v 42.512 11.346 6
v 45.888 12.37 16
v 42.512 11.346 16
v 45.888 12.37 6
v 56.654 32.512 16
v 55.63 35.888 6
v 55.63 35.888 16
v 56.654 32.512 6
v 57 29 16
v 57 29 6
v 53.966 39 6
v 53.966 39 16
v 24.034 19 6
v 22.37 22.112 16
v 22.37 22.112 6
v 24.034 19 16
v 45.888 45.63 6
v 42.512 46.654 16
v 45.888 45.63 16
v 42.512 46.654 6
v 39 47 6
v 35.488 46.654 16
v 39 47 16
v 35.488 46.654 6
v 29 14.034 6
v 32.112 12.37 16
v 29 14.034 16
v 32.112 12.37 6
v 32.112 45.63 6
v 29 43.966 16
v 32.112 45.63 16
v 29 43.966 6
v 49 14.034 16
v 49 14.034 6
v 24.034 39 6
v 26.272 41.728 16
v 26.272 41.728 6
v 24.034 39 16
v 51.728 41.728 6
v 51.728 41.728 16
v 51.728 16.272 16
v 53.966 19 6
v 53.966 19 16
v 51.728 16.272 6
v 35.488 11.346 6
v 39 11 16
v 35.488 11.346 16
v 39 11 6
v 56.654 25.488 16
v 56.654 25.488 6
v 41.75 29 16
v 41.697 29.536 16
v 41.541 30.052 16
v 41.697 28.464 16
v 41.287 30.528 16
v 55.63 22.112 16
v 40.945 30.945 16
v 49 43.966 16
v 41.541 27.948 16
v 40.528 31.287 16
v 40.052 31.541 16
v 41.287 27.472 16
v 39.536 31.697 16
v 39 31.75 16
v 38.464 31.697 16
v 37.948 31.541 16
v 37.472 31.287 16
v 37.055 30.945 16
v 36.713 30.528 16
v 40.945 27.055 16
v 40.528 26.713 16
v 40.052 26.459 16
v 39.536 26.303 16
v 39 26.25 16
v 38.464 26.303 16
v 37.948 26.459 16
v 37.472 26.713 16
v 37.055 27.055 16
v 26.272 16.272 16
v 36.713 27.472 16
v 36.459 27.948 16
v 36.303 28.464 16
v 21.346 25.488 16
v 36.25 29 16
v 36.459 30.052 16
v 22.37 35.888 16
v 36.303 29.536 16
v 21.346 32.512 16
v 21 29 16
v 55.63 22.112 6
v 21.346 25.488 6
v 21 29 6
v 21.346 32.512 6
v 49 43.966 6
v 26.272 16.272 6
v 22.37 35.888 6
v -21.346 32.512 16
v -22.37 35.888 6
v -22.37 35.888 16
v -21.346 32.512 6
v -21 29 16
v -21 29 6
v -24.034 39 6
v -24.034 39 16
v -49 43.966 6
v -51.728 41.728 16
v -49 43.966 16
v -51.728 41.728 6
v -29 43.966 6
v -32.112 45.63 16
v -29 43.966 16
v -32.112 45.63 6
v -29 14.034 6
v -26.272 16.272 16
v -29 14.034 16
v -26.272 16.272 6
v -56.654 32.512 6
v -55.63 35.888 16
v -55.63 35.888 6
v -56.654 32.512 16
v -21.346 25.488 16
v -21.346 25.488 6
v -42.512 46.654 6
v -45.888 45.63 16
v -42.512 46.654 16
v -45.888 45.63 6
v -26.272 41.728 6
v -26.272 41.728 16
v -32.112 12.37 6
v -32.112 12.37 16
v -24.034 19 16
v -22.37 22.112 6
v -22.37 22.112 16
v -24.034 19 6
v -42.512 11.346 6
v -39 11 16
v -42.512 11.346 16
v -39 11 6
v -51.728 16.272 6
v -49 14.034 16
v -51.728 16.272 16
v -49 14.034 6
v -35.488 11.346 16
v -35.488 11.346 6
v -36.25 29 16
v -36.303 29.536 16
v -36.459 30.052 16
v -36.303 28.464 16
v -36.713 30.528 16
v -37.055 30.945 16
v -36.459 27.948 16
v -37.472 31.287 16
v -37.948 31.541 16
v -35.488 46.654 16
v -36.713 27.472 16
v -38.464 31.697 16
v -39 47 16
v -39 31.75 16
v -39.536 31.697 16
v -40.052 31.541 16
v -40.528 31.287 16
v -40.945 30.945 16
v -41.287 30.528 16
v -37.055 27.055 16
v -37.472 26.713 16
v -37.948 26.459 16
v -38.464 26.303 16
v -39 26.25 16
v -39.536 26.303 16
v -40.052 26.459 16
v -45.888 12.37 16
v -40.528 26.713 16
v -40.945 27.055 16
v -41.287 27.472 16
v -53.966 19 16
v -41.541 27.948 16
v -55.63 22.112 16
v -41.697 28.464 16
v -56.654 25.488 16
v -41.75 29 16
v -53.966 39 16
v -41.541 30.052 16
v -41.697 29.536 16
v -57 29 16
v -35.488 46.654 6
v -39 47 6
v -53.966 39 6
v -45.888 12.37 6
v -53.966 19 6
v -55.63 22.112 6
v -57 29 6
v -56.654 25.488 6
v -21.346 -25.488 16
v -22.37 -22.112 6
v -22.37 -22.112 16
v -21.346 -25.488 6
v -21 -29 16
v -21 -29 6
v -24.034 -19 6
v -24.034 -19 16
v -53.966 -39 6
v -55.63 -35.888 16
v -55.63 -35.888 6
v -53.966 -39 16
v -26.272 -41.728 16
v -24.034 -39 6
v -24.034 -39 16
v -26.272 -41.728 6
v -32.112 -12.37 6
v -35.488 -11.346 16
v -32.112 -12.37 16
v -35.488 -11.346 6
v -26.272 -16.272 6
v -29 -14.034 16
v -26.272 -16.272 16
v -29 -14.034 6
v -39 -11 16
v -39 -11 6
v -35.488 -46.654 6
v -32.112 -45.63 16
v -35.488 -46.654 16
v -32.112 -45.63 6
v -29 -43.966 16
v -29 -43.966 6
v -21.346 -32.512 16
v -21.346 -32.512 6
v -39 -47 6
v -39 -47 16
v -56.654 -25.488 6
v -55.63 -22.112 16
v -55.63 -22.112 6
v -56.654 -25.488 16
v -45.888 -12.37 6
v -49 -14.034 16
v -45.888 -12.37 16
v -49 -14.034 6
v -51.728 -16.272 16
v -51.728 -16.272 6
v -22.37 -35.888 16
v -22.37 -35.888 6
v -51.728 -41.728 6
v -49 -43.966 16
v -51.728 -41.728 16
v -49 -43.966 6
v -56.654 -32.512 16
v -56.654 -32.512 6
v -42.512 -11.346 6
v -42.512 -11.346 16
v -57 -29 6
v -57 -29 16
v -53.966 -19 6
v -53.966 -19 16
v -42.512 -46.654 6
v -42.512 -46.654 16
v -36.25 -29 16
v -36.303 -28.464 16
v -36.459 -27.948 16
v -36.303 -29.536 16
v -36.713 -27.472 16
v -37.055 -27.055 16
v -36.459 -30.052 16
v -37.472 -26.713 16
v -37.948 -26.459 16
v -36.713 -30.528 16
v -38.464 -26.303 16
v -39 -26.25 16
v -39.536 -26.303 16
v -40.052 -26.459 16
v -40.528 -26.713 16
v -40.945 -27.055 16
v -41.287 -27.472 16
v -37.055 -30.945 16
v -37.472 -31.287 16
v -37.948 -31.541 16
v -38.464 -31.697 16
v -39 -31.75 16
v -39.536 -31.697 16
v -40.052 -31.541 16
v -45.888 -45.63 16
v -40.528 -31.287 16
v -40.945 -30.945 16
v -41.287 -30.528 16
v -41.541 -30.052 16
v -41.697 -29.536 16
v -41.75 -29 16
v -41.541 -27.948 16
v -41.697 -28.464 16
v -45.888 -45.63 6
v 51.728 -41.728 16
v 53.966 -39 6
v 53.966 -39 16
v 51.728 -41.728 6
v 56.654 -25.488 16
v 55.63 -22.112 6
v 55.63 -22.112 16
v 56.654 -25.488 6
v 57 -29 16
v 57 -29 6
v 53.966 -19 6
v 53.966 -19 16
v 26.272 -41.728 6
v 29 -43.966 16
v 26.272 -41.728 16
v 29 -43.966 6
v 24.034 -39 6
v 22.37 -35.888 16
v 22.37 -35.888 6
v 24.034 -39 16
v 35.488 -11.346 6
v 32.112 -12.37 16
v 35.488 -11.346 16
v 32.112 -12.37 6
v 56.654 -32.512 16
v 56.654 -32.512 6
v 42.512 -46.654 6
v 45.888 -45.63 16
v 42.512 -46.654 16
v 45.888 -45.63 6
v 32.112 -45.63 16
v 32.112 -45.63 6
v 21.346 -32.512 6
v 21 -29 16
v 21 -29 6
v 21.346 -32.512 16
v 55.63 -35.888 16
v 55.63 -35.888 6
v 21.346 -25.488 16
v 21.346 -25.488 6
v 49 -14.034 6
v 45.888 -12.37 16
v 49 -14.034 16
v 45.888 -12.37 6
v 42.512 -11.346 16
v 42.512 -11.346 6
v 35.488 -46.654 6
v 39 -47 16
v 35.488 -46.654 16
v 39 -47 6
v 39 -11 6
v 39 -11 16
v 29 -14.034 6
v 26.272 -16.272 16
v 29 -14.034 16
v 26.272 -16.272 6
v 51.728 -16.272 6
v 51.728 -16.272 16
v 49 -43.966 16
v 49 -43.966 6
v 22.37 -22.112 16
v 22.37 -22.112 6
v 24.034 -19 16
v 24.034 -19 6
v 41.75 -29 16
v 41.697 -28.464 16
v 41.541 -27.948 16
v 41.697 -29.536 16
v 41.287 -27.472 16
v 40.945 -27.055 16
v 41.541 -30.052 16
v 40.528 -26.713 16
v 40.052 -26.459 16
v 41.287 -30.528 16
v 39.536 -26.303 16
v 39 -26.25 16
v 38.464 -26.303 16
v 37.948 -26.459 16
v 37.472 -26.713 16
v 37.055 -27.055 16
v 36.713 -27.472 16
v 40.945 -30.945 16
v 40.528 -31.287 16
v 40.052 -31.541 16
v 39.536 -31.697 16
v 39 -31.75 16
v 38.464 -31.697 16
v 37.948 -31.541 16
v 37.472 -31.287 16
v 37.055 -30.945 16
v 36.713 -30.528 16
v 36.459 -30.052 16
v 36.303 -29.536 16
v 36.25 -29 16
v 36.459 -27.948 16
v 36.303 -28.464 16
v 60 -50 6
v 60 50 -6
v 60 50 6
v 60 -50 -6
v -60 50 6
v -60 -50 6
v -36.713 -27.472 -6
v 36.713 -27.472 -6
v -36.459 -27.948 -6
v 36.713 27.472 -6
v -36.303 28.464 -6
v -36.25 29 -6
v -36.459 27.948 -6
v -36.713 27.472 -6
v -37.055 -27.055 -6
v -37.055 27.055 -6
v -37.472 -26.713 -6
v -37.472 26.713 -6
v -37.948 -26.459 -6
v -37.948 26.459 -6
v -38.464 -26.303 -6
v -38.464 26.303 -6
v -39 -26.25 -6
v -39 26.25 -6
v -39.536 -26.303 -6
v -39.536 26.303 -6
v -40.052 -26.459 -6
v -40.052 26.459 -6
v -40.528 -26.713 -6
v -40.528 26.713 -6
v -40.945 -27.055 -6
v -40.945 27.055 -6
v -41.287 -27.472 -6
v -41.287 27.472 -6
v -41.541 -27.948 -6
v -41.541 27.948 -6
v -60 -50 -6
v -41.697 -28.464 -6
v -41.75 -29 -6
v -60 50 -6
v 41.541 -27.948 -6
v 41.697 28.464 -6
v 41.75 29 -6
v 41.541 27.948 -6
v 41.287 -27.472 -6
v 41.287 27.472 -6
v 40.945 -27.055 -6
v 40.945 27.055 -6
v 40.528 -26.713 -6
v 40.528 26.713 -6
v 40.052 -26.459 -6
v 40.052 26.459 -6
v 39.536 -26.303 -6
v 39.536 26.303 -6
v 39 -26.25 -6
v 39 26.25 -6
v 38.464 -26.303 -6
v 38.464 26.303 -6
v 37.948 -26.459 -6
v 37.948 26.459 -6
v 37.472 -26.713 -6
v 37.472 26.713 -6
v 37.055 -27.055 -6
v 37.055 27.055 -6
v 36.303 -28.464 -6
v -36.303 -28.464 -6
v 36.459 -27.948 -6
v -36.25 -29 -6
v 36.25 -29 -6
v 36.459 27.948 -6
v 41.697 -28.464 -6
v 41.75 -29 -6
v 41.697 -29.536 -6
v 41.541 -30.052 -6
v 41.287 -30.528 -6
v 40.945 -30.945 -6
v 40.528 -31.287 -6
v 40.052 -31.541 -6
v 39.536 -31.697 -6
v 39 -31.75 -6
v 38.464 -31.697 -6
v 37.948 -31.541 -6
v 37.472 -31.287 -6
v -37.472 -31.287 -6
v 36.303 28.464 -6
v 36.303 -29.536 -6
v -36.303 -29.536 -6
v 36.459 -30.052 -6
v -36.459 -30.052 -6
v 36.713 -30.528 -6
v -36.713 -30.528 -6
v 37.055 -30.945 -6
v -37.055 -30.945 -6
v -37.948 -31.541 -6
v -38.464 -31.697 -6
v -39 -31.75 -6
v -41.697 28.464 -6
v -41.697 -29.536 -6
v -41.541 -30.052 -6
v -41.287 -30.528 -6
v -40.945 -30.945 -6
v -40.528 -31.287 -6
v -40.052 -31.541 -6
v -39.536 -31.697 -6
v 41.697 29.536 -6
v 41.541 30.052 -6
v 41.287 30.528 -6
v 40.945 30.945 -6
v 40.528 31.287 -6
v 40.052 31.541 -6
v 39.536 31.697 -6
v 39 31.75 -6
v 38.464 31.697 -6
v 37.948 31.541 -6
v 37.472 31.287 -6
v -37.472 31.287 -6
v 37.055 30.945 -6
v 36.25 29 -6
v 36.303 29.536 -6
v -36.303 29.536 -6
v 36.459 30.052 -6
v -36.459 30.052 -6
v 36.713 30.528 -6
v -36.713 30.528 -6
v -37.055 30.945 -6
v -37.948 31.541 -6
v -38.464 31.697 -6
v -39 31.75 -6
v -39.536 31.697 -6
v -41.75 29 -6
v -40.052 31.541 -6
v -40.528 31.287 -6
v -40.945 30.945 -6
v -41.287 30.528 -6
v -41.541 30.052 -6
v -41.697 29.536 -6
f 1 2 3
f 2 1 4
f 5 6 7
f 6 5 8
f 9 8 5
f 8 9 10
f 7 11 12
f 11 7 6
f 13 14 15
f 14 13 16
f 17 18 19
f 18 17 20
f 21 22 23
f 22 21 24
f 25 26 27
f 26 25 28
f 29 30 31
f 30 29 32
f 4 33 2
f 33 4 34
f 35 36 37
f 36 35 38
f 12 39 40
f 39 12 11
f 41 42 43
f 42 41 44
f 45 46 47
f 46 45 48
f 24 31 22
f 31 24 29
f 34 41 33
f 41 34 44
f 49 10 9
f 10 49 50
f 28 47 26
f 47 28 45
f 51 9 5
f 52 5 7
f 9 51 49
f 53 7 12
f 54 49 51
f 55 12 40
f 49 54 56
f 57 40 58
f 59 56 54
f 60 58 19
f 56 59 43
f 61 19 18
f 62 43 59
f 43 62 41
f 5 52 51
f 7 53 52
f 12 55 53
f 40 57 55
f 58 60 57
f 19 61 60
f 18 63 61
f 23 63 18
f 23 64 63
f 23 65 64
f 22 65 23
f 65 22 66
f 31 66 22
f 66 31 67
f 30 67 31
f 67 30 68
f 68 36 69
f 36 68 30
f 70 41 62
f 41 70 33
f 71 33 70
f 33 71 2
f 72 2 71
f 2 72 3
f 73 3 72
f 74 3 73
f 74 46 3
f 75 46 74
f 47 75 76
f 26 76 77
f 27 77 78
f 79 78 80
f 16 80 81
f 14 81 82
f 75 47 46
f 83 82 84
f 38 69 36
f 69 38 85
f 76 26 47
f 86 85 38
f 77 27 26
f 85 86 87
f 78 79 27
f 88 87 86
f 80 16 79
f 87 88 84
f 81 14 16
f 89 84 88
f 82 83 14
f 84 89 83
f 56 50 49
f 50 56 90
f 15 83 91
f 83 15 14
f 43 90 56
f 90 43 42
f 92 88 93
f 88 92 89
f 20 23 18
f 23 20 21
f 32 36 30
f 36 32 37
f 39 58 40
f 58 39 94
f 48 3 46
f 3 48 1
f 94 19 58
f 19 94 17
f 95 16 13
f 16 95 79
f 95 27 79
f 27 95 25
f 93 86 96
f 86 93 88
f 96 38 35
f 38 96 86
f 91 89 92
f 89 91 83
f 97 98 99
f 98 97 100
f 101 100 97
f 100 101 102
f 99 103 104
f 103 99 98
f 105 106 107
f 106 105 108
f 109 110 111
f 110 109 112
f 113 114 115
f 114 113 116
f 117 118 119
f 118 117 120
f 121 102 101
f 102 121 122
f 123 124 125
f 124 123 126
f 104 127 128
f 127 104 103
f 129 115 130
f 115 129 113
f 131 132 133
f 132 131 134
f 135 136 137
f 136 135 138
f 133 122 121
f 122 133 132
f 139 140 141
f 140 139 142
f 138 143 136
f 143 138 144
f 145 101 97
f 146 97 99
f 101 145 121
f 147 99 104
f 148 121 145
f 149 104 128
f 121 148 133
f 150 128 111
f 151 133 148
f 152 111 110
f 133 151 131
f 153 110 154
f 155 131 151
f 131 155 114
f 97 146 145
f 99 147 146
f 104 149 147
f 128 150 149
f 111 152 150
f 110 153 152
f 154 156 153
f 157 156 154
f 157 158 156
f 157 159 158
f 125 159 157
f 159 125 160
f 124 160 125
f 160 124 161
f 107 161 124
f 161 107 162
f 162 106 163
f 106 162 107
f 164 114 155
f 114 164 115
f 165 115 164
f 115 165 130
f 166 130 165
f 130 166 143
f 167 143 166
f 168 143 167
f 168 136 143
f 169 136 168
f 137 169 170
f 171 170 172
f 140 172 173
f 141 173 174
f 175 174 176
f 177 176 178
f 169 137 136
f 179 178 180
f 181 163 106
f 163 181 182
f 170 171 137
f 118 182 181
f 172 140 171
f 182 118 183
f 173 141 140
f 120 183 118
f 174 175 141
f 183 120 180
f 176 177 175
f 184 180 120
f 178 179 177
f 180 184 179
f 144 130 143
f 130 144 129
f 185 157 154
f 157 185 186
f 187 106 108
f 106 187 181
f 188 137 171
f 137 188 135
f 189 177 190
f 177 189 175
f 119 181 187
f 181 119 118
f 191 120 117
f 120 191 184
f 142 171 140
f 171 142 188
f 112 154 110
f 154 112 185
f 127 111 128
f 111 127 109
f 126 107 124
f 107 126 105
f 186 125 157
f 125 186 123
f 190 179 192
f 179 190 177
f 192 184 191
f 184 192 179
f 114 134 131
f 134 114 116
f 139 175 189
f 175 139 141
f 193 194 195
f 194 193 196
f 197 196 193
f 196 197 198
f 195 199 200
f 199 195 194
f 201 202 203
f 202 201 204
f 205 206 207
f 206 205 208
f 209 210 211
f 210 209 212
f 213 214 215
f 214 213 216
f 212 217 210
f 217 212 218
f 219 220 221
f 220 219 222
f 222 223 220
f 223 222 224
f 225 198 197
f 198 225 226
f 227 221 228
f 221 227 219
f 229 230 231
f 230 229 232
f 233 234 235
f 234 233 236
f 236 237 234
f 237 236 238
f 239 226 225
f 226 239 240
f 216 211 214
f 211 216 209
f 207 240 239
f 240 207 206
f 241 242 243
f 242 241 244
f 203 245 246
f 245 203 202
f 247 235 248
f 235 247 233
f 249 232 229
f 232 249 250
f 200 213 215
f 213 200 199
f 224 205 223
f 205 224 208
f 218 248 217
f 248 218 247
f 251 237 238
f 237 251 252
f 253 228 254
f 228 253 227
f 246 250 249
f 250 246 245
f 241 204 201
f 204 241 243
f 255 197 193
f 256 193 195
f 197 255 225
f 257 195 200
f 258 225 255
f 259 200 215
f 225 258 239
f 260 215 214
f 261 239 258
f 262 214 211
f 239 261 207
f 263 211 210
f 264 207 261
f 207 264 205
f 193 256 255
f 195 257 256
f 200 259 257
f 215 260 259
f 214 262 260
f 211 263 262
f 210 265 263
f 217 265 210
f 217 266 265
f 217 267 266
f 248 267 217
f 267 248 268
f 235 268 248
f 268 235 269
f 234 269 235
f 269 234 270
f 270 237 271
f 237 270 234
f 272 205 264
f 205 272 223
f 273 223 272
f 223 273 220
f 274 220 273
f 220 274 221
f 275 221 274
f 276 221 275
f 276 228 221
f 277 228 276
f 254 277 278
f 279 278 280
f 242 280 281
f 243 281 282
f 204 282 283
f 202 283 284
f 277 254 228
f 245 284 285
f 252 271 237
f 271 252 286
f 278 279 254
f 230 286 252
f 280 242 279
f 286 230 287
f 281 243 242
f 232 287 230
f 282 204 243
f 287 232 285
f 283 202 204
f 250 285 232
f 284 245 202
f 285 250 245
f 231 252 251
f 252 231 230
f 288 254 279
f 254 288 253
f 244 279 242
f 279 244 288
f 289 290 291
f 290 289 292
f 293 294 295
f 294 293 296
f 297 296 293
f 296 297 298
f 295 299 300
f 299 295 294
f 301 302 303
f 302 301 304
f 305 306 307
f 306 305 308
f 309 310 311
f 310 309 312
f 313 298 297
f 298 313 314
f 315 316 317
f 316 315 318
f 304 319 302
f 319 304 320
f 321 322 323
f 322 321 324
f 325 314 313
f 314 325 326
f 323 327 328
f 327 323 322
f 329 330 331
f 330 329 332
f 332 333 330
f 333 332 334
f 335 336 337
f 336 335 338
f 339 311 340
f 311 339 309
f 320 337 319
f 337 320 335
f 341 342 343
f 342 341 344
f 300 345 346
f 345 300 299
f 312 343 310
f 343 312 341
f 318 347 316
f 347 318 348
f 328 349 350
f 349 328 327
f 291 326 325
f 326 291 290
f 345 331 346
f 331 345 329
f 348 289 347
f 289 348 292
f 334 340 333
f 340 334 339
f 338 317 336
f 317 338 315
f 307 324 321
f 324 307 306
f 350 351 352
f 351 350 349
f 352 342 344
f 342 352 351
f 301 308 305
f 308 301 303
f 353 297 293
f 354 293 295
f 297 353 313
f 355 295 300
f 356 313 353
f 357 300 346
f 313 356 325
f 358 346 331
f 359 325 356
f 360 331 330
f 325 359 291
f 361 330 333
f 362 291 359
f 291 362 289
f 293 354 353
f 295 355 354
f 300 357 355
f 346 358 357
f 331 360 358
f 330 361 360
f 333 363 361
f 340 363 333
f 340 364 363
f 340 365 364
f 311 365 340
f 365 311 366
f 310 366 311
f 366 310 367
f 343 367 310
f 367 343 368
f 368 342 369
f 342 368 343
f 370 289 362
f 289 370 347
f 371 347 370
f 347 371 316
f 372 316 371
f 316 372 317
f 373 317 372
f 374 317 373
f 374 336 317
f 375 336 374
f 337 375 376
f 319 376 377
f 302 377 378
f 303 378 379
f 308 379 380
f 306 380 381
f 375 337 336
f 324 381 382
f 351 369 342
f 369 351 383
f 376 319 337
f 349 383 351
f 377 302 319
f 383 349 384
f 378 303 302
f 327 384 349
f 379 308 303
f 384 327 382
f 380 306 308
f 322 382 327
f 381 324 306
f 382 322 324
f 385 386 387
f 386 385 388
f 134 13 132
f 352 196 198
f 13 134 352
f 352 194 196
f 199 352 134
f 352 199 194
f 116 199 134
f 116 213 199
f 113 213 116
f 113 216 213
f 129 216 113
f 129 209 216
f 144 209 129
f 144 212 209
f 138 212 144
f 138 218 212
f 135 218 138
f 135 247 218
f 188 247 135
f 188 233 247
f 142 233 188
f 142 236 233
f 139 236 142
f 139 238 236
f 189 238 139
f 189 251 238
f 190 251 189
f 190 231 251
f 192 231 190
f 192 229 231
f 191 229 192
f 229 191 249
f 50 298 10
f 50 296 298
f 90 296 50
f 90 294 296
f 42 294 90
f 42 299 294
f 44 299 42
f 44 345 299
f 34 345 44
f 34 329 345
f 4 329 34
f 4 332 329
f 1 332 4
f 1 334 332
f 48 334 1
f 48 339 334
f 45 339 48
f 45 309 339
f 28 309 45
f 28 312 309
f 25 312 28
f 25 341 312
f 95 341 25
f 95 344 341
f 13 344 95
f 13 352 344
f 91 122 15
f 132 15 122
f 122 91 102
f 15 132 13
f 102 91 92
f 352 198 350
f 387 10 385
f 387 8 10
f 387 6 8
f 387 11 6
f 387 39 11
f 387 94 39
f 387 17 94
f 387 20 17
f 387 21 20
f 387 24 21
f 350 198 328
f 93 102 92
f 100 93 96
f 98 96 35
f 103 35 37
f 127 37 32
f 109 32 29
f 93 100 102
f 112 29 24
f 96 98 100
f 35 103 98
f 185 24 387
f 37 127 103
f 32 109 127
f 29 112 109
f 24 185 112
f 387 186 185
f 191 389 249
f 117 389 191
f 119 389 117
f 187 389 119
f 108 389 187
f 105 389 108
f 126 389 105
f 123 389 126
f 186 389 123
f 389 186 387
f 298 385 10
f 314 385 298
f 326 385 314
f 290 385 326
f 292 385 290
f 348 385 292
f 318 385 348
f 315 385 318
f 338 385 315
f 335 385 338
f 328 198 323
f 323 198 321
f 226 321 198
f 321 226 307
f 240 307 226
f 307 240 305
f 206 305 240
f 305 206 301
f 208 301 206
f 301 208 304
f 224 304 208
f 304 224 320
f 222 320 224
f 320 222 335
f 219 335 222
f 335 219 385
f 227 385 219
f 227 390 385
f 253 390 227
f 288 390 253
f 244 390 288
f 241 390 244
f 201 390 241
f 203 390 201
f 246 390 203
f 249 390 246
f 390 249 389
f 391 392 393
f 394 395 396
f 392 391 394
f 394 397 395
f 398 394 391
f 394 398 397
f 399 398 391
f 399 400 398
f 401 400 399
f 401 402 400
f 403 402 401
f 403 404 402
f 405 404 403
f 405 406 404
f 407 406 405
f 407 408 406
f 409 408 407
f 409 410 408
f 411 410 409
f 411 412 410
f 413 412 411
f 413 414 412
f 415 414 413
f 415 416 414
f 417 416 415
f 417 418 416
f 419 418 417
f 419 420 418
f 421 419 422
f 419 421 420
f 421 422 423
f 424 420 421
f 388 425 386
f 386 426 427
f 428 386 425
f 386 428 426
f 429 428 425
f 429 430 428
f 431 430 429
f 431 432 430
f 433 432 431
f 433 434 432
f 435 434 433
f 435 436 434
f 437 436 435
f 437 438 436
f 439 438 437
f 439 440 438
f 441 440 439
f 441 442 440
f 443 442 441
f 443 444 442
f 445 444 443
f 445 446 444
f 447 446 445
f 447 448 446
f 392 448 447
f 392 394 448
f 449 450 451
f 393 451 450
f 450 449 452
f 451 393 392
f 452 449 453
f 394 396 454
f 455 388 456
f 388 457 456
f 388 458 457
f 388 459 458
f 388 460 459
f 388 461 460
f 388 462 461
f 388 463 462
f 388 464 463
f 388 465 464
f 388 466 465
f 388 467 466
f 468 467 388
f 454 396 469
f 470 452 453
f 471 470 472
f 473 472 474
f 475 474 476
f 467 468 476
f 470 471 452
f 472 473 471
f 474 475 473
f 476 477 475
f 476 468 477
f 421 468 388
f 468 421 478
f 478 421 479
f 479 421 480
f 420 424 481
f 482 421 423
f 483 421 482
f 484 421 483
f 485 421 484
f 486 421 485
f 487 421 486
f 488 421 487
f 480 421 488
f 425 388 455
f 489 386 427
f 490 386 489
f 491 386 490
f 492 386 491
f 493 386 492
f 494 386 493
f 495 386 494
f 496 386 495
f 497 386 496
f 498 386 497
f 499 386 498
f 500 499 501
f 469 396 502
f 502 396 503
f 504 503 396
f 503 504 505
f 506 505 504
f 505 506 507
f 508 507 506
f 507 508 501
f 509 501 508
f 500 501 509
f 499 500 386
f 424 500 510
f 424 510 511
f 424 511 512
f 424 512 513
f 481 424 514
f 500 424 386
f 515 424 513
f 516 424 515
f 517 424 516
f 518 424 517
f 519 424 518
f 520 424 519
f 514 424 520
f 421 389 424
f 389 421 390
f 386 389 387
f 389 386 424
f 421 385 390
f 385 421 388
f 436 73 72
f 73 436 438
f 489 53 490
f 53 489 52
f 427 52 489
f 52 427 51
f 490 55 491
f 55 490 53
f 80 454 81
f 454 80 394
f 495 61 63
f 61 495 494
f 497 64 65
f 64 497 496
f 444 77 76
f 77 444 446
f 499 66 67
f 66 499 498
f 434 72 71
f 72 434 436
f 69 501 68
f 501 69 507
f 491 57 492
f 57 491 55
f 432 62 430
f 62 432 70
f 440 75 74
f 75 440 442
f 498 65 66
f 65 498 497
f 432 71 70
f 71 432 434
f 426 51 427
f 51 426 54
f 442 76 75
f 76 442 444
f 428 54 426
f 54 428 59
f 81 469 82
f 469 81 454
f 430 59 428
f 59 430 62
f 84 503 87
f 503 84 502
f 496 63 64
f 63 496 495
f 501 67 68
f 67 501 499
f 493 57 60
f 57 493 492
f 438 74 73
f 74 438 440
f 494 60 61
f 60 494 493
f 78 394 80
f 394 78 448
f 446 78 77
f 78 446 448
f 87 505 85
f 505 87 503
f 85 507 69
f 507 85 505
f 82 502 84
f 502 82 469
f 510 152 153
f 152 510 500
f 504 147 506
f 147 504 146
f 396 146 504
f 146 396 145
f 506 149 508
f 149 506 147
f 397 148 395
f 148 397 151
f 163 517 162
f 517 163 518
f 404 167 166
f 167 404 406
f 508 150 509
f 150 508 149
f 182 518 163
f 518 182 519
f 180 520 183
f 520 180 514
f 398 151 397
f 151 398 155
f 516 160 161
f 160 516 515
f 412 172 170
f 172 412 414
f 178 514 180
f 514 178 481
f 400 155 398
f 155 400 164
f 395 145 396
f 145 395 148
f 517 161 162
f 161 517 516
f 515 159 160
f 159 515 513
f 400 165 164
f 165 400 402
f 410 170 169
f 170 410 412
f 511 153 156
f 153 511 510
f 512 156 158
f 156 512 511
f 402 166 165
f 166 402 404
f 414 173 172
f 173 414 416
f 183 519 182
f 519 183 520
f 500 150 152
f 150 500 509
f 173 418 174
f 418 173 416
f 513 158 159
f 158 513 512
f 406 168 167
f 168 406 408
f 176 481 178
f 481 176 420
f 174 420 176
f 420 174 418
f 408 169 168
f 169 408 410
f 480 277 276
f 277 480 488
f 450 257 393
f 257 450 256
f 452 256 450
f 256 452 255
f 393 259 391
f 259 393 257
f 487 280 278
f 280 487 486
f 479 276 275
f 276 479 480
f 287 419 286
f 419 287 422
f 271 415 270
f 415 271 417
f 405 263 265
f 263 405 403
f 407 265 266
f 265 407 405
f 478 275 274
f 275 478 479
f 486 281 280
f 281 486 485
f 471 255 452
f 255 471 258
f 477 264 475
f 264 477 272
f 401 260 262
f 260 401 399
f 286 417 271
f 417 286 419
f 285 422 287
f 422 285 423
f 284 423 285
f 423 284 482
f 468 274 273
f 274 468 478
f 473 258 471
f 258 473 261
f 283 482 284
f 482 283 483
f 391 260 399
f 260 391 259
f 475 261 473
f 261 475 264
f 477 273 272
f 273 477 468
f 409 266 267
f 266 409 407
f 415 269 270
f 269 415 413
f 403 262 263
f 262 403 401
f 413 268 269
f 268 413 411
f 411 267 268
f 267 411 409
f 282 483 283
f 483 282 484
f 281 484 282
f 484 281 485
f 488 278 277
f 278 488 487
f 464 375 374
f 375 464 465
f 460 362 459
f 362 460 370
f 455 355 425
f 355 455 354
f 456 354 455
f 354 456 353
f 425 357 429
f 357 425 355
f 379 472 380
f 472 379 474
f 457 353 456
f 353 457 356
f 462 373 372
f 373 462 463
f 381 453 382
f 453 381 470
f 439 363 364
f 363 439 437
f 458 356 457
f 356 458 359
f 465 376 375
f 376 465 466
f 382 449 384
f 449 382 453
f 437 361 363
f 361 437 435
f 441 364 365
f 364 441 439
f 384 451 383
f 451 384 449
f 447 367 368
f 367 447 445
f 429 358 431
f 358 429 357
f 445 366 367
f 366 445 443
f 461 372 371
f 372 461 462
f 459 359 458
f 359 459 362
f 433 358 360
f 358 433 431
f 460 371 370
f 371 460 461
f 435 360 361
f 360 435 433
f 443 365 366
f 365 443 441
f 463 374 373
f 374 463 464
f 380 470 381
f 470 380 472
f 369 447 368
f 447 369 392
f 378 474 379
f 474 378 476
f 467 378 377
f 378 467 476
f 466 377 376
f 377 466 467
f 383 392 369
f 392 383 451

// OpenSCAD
$fn = 32;

// ----------------------------------------------------------------------
// Anchor pads 120 x 100 x 22
// four corner bosses with anchor holes
// ----------------------------------------------------------------------

// --- parameters (mm) ---
plate = [120, 100, 12];  // base plate size (x, y, z)
pads = 4;                // boss count, one per corner
edge = 21;               // boss centre offset from the plate edge
boss_d = 36;             // boss diameter
boss_h = 10;             // boss height above the base plate
hole_d = 5.5;            // hole diameter

// --- derived feature positions (mm) ---
height = plate[2] + boss_h;      // = 22   overall height of the part
corner_x = plate[0] / 2 - edge;  // = 39   boss centre X
corner_y = plate[1] / 2 - edge;  // = 29   boss centre Y
feature_centers = [
  [corner_x, corner_y],
  [-corner_x, corner_y],
  [-corner_x, -corner_y],
  [corner_x, -corner_y]
];   // boss centres, anchor holes are drilled there

// base plate, four bosses standing on it, anchor holes all the way through
difference() {
  union() {
    cube(plate, center = true);
    for (centre = feature_centers)
      translate([centre[0], centre[1], plate[2] / 2 - 1])
        cylinder(d = boss_d, h = boss_h + 1);
  }
  for (centre = feature_centers)
    translate([centre[0], centre[1], -height])
      cylinder(d = hole_d, h = 2 * height + 2);  // through boss and plate
}
